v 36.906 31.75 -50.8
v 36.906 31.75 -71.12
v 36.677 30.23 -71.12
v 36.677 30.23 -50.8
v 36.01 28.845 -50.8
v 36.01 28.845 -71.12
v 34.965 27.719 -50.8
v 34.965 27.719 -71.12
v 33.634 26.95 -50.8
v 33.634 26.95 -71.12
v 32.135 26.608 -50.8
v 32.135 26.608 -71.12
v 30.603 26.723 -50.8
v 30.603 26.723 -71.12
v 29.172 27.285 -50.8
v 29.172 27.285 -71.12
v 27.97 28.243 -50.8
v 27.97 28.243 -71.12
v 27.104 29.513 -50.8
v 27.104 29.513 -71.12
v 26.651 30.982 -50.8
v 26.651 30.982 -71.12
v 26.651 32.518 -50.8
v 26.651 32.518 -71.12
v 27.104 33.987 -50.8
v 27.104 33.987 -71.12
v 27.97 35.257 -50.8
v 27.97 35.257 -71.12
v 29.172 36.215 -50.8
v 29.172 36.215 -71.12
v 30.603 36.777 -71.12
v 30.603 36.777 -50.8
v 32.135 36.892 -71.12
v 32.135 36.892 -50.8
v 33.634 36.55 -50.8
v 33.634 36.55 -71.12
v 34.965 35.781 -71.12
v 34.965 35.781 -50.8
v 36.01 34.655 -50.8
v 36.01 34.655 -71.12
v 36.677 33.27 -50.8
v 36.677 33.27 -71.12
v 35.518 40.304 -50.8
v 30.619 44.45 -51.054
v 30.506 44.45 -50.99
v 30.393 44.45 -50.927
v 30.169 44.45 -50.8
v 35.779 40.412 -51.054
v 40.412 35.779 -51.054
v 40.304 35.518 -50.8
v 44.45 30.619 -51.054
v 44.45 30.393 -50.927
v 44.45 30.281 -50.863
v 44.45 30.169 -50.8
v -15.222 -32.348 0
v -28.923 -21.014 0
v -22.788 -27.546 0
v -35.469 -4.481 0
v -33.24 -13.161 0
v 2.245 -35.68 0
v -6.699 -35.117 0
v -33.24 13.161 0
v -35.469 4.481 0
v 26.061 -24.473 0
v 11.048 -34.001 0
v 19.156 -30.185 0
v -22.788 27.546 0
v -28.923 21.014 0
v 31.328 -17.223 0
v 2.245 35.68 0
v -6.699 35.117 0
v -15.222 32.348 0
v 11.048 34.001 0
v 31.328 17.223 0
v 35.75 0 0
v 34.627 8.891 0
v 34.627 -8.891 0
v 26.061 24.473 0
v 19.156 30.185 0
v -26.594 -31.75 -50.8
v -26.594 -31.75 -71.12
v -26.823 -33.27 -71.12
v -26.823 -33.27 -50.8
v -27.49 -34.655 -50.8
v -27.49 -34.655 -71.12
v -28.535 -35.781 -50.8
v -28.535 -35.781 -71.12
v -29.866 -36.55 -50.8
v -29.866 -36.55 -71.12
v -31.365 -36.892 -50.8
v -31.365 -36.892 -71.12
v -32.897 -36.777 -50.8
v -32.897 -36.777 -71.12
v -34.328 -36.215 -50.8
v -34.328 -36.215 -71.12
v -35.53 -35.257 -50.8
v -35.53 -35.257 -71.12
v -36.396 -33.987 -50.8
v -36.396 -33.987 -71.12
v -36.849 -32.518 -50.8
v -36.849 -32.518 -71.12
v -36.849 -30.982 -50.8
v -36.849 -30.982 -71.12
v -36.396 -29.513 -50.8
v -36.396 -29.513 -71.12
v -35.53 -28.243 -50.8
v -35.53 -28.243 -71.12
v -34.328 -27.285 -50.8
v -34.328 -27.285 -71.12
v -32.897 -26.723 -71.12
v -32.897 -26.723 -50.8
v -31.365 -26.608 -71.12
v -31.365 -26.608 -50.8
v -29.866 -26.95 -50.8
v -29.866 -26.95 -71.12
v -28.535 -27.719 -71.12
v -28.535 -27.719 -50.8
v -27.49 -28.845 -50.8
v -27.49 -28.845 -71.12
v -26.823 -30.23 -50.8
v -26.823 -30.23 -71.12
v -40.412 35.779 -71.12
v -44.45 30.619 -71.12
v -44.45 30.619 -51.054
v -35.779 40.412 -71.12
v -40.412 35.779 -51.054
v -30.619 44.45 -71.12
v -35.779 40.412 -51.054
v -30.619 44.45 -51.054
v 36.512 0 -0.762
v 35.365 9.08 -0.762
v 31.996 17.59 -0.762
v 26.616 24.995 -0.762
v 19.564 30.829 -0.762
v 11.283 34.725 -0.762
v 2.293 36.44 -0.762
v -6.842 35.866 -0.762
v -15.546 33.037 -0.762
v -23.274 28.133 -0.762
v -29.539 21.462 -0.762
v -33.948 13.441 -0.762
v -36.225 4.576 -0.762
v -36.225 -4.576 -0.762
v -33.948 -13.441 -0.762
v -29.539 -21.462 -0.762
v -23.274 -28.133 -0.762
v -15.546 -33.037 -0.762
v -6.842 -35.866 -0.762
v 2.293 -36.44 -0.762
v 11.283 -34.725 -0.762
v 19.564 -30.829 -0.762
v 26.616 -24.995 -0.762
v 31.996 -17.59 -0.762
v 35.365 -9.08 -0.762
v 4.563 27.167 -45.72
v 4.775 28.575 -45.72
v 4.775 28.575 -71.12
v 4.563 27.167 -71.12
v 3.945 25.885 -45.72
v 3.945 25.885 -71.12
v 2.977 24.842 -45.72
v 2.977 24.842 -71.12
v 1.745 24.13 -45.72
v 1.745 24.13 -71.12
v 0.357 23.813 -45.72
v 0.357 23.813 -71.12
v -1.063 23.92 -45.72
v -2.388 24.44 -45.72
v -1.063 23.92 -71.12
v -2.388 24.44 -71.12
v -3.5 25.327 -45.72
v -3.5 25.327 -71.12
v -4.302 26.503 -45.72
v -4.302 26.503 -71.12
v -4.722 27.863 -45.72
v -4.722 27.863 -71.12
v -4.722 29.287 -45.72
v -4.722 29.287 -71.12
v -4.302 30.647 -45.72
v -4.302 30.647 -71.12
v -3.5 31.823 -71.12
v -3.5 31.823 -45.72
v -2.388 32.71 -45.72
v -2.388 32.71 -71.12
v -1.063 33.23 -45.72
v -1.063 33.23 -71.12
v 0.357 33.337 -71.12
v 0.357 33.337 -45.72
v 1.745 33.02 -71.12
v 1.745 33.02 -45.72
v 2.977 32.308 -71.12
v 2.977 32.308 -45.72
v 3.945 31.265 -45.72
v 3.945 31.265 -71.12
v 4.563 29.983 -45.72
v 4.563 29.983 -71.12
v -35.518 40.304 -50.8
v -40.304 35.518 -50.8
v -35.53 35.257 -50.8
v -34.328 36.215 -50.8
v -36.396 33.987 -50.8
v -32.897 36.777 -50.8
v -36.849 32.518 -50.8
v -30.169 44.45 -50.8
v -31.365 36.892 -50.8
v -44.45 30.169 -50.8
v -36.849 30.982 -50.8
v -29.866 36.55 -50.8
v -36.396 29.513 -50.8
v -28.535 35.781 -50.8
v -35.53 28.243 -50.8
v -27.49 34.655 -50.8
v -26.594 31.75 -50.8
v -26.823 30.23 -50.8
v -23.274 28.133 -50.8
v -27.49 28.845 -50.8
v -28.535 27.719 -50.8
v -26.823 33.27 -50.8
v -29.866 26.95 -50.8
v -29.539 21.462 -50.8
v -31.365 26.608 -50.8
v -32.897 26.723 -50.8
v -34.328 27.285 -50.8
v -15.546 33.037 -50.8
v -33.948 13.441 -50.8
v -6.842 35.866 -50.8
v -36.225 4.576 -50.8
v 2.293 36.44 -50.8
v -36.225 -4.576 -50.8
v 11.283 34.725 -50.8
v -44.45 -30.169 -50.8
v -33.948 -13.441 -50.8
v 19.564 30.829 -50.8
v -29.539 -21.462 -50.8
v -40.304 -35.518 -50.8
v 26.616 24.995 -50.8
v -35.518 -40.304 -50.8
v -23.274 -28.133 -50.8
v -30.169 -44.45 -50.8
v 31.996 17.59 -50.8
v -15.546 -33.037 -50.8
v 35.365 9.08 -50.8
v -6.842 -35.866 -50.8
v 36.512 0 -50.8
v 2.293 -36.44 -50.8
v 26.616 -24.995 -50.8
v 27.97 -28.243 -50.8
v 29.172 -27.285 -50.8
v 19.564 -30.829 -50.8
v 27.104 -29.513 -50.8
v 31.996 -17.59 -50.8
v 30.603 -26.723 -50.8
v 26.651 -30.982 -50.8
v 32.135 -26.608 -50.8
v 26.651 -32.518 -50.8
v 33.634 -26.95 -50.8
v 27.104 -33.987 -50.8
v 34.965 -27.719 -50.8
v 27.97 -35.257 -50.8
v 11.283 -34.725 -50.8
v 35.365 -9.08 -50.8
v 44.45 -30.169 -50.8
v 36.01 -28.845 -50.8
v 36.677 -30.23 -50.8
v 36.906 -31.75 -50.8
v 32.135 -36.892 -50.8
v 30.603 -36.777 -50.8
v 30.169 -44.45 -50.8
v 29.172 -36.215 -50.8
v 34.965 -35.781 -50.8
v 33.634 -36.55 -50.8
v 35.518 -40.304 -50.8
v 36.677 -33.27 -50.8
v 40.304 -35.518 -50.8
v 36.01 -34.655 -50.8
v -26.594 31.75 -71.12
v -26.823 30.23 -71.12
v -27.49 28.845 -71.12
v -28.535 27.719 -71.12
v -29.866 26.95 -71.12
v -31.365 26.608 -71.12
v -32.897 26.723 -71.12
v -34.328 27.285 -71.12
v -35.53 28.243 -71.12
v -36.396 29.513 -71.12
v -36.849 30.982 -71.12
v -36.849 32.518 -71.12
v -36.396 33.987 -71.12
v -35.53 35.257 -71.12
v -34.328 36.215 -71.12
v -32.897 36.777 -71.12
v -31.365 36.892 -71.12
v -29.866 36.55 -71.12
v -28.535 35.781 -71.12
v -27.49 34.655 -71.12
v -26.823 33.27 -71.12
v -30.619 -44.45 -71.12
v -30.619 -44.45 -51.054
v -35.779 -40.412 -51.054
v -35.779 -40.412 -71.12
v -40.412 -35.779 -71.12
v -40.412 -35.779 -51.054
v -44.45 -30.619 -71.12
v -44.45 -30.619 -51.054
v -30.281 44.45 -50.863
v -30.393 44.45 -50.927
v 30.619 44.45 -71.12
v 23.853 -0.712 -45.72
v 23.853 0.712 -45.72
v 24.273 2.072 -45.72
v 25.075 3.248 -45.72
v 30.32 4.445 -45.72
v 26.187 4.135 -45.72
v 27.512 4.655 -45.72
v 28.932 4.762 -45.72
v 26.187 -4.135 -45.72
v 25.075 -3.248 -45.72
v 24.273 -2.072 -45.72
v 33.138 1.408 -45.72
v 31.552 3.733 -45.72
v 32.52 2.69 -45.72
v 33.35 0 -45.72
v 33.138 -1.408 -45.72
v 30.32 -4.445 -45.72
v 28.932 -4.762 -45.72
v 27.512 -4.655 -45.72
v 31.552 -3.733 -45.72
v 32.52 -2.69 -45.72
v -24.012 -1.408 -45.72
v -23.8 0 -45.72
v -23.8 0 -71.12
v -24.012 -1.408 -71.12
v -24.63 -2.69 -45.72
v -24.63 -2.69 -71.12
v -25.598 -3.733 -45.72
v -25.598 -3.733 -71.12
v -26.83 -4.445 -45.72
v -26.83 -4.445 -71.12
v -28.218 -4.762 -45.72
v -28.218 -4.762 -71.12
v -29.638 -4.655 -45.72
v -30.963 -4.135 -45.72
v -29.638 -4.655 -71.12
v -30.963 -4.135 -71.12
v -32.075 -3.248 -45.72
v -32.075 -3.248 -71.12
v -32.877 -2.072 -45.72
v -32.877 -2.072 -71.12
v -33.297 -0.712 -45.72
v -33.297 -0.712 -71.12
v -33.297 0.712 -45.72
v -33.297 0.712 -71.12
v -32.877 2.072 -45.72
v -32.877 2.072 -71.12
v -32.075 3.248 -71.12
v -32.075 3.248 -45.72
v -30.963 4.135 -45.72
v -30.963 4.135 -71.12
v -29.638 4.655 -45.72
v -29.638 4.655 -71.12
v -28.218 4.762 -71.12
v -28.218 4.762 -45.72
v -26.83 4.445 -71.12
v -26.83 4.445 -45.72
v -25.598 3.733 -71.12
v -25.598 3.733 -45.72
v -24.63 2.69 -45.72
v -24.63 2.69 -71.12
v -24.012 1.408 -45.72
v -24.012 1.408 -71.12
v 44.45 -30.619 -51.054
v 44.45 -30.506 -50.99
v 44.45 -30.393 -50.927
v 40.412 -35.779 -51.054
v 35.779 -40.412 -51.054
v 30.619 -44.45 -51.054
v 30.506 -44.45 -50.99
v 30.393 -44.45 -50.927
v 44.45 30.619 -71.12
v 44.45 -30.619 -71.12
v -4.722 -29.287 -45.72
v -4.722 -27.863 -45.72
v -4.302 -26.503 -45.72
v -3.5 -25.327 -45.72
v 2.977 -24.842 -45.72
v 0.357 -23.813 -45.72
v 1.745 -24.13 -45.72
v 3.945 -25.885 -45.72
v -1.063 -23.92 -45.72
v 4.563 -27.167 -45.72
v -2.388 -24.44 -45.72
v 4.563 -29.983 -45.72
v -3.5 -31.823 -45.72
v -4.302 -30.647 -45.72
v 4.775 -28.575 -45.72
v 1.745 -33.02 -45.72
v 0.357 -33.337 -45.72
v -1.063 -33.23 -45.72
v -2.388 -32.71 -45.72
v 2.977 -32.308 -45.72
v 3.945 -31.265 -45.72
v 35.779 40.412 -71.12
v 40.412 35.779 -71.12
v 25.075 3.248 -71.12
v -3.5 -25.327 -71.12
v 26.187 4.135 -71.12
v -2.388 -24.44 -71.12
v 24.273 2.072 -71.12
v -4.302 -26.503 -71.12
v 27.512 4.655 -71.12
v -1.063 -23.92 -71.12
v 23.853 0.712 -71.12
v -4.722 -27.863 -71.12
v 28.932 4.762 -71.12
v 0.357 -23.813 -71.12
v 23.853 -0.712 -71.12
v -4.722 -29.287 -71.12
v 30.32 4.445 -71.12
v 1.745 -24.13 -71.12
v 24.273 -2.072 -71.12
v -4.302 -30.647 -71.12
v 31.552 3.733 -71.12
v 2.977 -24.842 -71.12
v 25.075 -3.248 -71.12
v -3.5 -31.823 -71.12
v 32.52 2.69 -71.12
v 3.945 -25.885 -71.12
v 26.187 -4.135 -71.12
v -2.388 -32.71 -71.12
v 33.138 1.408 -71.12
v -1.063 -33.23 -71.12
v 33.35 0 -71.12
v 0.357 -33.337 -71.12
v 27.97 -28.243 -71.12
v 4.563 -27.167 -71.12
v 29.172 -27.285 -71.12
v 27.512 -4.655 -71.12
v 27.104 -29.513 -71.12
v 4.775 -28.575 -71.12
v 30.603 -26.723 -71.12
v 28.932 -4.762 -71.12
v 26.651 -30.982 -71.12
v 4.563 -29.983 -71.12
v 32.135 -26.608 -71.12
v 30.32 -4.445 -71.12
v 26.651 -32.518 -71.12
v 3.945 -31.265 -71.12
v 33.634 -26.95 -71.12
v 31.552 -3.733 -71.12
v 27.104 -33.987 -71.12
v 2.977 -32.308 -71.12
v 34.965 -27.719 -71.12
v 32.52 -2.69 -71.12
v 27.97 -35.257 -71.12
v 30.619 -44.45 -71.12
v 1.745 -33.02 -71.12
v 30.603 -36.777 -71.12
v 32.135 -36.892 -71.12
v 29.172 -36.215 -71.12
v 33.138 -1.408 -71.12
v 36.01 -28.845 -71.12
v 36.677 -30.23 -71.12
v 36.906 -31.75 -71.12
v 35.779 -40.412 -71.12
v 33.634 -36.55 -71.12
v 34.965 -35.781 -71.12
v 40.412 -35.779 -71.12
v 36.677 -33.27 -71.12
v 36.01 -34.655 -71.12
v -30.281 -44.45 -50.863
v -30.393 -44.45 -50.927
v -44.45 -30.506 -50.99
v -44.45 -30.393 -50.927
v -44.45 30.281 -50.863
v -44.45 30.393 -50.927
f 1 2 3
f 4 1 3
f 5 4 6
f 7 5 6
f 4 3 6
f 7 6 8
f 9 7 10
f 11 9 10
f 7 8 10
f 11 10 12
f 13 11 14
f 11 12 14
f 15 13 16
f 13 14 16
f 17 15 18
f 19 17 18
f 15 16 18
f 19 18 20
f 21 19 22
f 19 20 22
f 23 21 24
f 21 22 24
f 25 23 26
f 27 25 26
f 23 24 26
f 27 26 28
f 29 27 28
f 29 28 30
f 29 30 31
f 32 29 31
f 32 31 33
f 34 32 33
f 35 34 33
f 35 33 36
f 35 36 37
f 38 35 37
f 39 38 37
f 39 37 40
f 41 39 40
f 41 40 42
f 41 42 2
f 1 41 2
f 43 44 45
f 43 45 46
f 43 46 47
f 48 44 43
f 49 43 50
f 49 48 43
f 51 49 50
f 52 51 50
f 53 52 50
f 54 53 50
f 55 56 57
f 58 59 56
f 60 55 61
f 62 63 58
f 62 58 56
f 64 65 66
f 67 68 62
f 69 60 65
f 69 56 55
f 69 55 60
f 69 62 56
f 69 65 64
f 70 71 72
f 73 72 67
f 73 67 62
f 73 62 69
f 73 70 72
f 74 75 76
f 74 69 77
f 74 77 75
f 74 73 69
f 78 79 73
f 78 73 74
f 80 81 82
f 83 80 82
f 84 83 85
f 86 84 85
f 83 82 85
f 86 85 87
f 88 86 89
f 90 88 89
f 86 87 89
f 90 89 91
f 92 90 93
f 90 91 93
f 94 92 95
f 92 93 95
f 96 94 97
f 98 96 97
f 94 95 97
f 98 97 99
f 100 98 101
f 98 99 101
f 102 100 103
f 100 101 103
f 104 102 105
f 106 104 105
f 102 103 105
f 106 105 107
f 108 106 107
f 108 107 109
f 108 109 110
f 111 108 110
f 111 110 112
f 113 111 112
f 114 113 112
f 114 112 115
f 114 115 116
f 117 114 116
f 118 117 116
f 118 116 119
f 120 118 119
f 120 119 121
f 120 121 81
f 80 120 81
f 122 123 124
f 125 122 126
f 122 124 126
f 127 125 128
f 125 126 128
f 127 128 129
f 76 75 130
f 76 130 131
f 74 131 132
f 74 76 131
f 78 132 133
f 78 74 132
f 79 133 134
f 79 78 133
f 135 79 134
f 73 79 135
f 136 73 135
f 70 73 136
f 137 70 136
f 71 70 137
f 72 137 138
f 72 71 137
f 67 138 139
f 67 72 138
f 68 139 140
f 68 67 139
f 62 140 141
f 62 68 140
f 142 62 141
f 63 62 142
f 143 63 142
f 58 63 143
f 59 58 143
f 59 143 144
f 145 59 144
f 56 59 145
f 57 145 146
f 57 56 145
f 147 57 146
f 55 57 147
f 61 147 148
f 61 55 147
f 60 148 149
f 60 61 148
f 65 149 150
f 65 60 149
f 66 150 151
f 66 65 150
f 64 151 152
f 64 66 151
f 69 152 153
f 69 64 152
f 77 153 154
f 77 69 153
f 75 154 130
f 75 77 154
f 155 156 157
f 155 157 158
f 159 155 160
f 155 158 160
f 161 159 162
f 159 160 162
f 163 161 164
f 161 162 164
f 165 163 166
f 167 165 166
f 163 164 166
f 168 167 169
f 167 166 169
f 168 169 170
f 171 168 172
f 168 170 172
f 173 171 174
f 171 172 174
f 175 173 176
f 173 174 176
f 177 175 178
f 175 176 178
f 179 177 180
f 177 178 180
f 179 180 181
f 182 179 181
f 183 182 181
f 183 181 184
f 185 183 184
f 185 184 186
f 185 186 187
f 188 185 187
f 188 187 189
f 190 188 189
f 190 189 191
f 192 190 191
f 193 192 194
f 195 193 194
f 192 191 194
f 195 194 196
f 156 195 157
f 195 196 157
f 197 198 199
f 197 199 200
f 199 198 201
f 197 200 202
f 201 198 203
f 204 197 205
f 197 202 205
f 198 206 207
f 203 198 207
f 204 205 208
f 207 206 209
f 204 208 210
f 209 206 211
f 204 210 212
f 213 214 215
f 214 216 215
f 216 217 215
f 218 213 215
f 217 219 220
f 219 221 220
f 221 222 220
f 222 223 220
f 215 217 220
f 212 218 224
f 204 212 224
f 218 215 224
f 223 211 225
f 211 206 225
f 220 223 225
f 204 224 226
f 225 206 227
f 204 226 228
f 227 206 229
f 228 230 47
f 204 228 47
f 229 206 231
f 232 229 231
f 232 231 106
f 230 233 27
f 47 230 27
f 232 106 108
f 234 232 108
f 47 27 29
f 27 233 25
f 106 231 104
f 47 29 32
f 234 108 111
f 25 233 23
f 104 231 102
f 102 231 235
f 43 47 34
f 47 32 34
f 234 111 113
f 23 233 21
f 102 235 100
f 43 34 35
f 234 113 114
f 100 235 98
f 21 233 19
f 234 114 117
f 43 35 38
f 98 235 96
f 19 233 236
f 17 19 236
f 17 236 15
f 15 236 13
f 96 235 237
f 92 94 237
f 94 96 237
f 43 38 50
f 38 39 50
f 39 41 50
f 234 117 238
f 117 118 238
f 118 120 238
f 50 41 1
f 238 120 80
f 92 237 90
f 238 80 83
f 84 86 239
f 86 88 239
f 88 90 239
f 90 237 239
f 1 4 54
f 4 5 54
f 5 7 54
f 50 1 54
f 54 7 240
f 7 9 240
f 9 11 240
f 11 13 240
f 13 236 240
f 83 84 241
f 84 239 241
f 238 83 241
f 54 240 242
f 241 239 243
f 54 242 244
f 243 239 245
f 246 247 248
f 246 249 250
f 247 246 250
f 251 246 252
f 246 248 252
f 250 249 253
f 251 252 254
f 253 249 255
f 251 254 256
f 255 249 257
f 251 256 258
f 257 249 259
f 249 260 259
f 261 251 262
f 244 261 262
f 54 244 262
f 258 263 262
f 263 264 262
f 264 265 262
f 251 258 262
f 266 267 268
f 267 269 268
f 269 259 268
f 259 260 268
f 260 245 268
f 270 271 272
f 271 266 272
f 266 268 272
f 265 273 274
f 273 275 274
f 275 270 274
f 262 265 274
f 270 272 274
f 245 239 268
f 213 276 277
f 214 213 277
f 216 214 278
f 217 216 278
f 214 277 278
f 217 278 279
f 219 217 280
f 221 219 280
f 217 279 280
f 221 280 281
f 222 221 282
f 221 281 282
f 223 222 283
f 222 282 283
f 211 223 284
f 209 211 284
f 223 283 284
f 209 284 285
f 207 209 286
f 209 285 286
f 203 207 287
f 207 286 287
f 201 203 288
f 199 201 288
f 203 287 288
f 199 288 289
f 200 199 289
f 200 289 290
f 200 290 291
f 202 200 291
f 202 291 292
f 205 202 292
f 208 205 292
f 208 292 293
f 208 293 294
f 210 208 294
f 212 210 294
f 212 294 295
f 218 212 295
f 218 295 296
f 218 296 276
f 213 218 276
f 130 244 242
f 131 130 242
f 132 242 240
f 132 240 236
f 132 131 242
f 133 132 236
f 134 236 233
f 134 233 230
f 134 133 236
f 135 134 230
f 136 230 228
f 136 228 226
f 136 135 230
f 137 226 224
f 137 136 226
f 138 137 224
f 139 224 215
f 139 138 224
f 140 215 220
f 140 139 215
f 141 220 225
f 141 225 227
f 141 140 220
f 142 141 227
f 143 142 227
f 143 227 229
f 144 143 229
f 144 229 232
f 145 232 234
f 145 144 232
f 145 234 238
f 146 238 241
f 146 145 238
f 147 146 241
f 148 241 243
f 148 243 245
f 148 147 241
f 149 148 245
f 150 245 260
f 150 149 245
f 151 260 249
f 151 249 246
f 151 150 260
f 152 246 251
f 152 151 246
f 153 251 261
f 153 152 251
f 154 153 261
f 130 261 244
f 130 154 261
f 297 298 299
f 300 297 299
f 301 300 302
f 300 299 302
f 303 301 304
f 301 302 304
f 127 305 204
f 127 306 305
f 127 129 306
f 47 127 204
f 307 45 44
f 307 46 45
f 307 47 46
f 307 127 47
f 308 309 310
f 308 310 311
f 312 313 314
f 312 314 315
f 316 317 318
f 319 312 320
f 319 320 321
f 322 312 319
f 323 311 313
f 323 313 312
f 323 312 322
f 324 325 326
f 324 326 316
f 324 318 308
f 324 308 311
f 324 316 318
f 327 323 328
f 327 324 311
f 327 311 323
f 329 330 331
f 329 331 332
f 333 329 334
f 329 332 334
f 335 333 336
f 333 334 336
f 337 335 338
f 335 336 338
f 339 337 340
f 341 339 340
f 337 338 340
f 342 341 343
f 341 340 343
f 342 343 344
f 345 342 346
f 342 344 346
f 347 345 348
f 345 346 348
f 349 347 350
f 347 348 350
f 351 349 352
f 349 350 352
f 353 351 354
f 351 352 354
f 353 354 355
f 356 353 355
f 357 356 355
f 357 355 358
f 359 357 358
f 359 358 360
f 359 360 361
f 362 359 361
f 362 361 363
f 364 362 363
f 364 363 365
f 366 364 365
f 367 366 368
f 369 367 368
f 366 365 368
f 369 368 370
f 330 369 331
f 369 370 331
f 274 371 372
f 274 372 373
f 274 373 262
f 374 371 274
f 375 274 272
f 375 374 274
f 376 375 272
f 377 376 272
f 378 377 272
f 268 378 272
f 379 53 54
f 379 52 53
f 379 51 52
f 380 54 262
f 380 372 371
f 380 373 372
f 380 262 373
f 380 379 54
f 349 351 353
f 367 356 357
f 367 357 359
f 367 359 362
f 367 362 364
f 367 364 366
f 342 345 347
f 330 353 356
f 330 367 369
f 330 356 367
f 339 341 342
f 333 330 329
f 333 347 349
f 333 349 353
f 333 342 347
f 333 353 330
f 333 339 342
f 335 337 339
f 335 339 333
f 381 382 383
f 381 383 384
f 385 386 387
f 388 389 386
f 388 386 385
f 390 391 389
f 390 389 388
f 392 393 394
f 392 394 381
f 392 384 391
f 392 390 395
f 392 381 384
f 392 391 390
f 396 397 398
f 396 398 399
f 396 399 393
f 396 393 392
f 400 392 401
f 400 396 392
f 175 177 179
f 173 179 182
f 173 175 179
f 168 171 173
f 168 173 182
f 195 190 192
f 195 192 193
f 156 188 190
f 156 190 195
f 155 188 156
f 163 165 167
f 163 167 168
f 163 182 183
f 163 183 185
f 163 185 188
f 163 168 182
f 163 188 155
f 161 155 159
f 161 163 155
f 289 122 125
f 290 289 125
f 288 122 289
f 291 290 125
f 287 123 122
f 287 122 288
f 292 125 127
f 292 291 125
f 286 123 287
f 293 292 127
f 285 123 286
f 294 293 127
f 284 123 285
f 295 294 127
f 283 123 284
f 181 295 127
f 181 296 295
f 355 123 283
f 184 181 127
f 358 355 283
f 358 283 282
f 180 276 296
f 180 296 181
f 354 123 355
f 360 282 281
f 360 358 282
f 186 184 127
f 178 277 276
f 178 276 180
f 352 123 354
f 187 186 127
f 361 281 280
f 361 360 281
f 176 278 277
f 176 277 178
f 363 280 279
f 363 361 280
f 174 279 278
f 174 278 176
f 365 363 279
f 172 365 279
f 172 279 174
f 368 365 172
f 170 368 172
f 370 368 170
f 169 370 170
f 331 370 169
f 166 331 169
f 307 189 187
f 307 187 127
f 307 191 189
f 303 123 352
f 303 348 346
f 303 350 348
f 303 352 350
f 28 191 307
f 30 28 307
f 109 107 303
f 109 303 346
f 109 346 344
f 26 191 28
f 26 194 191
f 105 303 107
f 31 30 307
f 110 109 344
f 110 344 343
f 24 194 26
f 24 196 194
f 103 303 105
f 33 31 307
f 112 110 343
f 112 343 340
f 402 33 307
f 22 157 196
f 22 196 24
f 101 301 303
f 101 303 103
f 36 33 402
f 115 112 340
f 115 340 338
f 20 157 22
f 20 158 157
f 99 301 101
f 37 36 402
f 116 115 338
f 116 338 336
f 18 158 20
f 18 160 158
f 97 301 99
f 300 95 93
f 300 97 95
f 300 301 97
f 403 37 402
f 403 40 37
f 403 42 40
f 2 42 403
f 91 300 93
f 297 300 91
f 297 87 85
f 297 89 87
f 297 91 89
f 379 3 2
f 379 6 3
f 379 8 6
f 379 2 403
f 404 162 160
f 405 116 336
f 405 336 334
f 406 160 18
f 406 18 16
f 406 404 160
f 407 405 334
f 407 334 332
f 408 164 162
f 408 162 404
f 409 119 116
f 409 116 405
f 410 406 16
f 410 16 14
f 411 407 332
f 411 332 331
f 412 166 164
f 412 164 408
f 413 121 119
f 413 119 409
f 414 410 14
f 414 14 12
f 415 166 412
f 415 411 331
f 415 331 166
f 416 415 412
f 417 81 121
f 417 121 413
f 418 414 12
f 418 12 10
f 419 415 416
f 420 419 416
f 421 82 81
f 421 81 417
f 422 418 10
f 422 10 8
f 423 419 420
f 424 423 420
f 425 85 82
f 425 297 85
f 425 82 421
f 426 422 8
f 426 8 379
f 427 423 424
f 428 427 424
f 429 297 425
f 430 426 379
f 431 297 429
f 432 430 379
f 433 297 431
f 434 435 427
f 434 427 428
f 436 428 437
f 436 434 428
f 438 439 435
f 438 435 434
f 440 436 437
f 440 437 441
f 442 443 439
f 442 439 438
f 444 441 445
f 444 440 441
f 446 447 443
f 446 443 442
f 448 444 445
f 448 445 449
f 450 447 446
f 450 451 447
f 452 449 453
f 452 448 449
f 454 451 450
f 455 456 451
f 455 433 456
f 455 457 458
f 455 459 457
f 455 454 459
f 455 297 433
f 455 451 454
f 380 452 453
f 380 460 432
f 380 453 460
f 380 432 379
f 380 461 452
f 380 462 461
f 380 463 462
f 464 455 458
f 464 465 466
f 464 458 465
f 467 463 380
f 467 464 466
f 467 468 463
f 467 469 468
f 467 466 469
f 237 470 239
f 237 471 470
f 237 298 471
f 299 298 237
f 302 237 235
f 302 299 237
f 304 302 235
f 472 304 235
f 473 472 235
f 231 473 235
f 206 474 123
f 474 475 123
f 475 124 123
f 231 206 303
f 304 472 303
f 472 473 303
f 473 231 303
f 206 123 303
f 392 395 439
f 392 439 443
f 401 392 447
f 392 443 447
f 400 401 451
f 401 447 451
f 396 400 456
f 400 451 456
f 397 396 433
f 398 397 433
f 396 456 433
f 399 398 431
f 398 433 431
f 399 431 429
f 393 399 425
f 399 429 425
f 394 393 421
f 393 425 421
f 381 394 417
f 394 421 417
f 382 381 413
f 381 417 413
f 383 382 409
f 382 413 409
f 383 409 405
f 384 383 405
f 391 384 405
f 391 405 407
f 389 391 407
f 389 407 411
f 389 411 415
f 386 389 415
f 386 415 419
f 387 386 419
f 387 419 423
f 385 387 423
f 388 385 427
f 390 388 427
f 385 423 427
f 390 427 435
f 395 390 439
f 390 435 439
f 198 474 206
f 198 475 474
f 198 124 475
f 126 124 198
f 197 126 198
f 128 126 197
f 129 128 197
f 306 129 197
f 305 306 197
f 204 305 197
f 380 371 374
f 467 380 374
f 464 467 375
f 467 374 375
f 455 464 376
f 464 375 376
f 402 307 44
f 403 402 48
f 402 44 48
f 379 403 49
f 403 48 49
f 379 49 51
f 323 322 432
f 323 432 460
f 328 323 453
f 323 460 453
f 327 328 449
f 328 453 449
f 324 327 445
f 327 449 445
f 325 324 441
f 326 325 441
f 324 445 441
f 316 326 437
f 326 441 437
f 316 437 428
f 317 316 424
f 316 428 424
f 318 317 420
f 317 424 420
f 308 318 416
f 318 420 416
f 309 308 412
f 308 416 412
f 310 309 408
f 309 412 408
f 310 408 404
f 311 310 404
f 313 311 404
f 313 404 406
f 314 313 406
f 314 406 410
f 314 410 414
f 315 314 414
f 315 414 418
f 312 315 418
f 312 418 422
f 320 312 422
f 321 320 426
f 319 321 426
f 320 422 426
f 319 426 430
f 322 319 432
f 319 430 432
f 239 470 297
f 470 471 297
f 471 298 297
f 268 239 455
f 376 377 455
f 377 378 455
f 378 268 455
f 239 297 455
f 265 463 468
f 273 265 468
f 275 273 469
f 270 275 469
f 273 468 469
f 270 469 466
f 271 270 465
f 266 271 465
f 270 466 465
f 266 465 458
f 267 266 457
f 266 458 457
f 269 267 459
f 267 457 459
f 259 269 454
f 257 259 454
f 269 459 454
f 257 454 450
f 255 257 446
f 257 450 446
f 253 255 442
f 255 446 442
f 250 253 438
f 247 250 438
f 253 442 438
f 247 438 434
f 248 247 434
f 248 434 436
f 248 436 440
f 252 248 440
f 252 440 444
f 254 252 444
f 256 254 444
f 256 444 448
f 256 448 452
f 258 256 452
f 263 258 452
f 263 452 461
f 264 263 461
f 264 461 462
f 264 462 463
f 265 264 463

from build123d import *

# Parameters (mm, degrees)
F0_R     = 36.5125
F1_DEPTH = 50.8
F2_R     = 53.975
F3_DEPTH = 20.32
F4_SIZE  = 0.762
F5_SIZE  = 0.254
F6_R     = 69.85
F6_W     = 88.9
F6_H     = 88.9
F7_DEPTH = 25.4
F8_R     = 4.7752
F8_R_2   = 5.1562
F9_DEPTH = 25.4


with BuildPart() as f1:
    # F0 (on Top) → F1 (new body)
    with BuildSketch(Plane.XY):
        Circle(F0_R)
    extrude(amount=-F1_DEPTH)

    # F2 (on face) → F3 (join)
    with BuildSketch(Plane(origin=(0, 0, -50.8), x_dir=(1, 0, 0), z_dir=(0, 0, -1))):
        Circle(F2_R)
    extrude(amount=F3_DEPTH)

    # F4
    f4_edges = [f1.edges().sort_by_distance(p)[0] for p in [
        (-36.5125, 0, 0),
    ]]
    chamfer(f4_edges, length=F4_SIZE)

    # F5
    f5_edges = [f1.edges().sort_by_distance(p)[0] for p in [
        (-53.975, 0, -50.8),
    ]]
    chamfer(f5_edges, length=F5_SIZE)

    # F6 (on face) → F7 (cut)
    with BuildSketch(Plane(origin=(0, 0, -71.12), x_dir=(1, 0, 0), z_dir=(0, 0, -1))):
        Circle(F6_R)
        Rectangle(F6_W, F6_H, mode=Mode.SUBTRACT)
    extrude(amount=-F7_DEPTH, mode=Mode.SUBTRACT)

    # F8 (on face) → F9 (cut)
    with BuildSketch(Plane(origin=(0, 0, -71.12), x_dir=(1, 0, 0), z_dir=(0, 0, -1))):
        with Locations((-28.575, 0)):
            Circle(F8_R)
        with Locations((28.575, 0)):
            Circle(F8_R)
        with Locations((0, 28.575)):
            Circle(F8_R)
        with Locations((0, -28.575)):
            Circle(F8_R)
        with Locations((-31.75, 31.75)):
            Circle(F8_R_2)
        with Locations((31.75, 31.75)):
            Circle(F8_R_2)
        with Locations((31.75, -31.75)):
            Circle(F8_R_2)
        with Locations((-31.75, -31.75)):
            Circle(F8_R_2)
    extrude(amount=-F9_DEPTH, mode=Mode.SUBTRACT)


solid = f1.part
